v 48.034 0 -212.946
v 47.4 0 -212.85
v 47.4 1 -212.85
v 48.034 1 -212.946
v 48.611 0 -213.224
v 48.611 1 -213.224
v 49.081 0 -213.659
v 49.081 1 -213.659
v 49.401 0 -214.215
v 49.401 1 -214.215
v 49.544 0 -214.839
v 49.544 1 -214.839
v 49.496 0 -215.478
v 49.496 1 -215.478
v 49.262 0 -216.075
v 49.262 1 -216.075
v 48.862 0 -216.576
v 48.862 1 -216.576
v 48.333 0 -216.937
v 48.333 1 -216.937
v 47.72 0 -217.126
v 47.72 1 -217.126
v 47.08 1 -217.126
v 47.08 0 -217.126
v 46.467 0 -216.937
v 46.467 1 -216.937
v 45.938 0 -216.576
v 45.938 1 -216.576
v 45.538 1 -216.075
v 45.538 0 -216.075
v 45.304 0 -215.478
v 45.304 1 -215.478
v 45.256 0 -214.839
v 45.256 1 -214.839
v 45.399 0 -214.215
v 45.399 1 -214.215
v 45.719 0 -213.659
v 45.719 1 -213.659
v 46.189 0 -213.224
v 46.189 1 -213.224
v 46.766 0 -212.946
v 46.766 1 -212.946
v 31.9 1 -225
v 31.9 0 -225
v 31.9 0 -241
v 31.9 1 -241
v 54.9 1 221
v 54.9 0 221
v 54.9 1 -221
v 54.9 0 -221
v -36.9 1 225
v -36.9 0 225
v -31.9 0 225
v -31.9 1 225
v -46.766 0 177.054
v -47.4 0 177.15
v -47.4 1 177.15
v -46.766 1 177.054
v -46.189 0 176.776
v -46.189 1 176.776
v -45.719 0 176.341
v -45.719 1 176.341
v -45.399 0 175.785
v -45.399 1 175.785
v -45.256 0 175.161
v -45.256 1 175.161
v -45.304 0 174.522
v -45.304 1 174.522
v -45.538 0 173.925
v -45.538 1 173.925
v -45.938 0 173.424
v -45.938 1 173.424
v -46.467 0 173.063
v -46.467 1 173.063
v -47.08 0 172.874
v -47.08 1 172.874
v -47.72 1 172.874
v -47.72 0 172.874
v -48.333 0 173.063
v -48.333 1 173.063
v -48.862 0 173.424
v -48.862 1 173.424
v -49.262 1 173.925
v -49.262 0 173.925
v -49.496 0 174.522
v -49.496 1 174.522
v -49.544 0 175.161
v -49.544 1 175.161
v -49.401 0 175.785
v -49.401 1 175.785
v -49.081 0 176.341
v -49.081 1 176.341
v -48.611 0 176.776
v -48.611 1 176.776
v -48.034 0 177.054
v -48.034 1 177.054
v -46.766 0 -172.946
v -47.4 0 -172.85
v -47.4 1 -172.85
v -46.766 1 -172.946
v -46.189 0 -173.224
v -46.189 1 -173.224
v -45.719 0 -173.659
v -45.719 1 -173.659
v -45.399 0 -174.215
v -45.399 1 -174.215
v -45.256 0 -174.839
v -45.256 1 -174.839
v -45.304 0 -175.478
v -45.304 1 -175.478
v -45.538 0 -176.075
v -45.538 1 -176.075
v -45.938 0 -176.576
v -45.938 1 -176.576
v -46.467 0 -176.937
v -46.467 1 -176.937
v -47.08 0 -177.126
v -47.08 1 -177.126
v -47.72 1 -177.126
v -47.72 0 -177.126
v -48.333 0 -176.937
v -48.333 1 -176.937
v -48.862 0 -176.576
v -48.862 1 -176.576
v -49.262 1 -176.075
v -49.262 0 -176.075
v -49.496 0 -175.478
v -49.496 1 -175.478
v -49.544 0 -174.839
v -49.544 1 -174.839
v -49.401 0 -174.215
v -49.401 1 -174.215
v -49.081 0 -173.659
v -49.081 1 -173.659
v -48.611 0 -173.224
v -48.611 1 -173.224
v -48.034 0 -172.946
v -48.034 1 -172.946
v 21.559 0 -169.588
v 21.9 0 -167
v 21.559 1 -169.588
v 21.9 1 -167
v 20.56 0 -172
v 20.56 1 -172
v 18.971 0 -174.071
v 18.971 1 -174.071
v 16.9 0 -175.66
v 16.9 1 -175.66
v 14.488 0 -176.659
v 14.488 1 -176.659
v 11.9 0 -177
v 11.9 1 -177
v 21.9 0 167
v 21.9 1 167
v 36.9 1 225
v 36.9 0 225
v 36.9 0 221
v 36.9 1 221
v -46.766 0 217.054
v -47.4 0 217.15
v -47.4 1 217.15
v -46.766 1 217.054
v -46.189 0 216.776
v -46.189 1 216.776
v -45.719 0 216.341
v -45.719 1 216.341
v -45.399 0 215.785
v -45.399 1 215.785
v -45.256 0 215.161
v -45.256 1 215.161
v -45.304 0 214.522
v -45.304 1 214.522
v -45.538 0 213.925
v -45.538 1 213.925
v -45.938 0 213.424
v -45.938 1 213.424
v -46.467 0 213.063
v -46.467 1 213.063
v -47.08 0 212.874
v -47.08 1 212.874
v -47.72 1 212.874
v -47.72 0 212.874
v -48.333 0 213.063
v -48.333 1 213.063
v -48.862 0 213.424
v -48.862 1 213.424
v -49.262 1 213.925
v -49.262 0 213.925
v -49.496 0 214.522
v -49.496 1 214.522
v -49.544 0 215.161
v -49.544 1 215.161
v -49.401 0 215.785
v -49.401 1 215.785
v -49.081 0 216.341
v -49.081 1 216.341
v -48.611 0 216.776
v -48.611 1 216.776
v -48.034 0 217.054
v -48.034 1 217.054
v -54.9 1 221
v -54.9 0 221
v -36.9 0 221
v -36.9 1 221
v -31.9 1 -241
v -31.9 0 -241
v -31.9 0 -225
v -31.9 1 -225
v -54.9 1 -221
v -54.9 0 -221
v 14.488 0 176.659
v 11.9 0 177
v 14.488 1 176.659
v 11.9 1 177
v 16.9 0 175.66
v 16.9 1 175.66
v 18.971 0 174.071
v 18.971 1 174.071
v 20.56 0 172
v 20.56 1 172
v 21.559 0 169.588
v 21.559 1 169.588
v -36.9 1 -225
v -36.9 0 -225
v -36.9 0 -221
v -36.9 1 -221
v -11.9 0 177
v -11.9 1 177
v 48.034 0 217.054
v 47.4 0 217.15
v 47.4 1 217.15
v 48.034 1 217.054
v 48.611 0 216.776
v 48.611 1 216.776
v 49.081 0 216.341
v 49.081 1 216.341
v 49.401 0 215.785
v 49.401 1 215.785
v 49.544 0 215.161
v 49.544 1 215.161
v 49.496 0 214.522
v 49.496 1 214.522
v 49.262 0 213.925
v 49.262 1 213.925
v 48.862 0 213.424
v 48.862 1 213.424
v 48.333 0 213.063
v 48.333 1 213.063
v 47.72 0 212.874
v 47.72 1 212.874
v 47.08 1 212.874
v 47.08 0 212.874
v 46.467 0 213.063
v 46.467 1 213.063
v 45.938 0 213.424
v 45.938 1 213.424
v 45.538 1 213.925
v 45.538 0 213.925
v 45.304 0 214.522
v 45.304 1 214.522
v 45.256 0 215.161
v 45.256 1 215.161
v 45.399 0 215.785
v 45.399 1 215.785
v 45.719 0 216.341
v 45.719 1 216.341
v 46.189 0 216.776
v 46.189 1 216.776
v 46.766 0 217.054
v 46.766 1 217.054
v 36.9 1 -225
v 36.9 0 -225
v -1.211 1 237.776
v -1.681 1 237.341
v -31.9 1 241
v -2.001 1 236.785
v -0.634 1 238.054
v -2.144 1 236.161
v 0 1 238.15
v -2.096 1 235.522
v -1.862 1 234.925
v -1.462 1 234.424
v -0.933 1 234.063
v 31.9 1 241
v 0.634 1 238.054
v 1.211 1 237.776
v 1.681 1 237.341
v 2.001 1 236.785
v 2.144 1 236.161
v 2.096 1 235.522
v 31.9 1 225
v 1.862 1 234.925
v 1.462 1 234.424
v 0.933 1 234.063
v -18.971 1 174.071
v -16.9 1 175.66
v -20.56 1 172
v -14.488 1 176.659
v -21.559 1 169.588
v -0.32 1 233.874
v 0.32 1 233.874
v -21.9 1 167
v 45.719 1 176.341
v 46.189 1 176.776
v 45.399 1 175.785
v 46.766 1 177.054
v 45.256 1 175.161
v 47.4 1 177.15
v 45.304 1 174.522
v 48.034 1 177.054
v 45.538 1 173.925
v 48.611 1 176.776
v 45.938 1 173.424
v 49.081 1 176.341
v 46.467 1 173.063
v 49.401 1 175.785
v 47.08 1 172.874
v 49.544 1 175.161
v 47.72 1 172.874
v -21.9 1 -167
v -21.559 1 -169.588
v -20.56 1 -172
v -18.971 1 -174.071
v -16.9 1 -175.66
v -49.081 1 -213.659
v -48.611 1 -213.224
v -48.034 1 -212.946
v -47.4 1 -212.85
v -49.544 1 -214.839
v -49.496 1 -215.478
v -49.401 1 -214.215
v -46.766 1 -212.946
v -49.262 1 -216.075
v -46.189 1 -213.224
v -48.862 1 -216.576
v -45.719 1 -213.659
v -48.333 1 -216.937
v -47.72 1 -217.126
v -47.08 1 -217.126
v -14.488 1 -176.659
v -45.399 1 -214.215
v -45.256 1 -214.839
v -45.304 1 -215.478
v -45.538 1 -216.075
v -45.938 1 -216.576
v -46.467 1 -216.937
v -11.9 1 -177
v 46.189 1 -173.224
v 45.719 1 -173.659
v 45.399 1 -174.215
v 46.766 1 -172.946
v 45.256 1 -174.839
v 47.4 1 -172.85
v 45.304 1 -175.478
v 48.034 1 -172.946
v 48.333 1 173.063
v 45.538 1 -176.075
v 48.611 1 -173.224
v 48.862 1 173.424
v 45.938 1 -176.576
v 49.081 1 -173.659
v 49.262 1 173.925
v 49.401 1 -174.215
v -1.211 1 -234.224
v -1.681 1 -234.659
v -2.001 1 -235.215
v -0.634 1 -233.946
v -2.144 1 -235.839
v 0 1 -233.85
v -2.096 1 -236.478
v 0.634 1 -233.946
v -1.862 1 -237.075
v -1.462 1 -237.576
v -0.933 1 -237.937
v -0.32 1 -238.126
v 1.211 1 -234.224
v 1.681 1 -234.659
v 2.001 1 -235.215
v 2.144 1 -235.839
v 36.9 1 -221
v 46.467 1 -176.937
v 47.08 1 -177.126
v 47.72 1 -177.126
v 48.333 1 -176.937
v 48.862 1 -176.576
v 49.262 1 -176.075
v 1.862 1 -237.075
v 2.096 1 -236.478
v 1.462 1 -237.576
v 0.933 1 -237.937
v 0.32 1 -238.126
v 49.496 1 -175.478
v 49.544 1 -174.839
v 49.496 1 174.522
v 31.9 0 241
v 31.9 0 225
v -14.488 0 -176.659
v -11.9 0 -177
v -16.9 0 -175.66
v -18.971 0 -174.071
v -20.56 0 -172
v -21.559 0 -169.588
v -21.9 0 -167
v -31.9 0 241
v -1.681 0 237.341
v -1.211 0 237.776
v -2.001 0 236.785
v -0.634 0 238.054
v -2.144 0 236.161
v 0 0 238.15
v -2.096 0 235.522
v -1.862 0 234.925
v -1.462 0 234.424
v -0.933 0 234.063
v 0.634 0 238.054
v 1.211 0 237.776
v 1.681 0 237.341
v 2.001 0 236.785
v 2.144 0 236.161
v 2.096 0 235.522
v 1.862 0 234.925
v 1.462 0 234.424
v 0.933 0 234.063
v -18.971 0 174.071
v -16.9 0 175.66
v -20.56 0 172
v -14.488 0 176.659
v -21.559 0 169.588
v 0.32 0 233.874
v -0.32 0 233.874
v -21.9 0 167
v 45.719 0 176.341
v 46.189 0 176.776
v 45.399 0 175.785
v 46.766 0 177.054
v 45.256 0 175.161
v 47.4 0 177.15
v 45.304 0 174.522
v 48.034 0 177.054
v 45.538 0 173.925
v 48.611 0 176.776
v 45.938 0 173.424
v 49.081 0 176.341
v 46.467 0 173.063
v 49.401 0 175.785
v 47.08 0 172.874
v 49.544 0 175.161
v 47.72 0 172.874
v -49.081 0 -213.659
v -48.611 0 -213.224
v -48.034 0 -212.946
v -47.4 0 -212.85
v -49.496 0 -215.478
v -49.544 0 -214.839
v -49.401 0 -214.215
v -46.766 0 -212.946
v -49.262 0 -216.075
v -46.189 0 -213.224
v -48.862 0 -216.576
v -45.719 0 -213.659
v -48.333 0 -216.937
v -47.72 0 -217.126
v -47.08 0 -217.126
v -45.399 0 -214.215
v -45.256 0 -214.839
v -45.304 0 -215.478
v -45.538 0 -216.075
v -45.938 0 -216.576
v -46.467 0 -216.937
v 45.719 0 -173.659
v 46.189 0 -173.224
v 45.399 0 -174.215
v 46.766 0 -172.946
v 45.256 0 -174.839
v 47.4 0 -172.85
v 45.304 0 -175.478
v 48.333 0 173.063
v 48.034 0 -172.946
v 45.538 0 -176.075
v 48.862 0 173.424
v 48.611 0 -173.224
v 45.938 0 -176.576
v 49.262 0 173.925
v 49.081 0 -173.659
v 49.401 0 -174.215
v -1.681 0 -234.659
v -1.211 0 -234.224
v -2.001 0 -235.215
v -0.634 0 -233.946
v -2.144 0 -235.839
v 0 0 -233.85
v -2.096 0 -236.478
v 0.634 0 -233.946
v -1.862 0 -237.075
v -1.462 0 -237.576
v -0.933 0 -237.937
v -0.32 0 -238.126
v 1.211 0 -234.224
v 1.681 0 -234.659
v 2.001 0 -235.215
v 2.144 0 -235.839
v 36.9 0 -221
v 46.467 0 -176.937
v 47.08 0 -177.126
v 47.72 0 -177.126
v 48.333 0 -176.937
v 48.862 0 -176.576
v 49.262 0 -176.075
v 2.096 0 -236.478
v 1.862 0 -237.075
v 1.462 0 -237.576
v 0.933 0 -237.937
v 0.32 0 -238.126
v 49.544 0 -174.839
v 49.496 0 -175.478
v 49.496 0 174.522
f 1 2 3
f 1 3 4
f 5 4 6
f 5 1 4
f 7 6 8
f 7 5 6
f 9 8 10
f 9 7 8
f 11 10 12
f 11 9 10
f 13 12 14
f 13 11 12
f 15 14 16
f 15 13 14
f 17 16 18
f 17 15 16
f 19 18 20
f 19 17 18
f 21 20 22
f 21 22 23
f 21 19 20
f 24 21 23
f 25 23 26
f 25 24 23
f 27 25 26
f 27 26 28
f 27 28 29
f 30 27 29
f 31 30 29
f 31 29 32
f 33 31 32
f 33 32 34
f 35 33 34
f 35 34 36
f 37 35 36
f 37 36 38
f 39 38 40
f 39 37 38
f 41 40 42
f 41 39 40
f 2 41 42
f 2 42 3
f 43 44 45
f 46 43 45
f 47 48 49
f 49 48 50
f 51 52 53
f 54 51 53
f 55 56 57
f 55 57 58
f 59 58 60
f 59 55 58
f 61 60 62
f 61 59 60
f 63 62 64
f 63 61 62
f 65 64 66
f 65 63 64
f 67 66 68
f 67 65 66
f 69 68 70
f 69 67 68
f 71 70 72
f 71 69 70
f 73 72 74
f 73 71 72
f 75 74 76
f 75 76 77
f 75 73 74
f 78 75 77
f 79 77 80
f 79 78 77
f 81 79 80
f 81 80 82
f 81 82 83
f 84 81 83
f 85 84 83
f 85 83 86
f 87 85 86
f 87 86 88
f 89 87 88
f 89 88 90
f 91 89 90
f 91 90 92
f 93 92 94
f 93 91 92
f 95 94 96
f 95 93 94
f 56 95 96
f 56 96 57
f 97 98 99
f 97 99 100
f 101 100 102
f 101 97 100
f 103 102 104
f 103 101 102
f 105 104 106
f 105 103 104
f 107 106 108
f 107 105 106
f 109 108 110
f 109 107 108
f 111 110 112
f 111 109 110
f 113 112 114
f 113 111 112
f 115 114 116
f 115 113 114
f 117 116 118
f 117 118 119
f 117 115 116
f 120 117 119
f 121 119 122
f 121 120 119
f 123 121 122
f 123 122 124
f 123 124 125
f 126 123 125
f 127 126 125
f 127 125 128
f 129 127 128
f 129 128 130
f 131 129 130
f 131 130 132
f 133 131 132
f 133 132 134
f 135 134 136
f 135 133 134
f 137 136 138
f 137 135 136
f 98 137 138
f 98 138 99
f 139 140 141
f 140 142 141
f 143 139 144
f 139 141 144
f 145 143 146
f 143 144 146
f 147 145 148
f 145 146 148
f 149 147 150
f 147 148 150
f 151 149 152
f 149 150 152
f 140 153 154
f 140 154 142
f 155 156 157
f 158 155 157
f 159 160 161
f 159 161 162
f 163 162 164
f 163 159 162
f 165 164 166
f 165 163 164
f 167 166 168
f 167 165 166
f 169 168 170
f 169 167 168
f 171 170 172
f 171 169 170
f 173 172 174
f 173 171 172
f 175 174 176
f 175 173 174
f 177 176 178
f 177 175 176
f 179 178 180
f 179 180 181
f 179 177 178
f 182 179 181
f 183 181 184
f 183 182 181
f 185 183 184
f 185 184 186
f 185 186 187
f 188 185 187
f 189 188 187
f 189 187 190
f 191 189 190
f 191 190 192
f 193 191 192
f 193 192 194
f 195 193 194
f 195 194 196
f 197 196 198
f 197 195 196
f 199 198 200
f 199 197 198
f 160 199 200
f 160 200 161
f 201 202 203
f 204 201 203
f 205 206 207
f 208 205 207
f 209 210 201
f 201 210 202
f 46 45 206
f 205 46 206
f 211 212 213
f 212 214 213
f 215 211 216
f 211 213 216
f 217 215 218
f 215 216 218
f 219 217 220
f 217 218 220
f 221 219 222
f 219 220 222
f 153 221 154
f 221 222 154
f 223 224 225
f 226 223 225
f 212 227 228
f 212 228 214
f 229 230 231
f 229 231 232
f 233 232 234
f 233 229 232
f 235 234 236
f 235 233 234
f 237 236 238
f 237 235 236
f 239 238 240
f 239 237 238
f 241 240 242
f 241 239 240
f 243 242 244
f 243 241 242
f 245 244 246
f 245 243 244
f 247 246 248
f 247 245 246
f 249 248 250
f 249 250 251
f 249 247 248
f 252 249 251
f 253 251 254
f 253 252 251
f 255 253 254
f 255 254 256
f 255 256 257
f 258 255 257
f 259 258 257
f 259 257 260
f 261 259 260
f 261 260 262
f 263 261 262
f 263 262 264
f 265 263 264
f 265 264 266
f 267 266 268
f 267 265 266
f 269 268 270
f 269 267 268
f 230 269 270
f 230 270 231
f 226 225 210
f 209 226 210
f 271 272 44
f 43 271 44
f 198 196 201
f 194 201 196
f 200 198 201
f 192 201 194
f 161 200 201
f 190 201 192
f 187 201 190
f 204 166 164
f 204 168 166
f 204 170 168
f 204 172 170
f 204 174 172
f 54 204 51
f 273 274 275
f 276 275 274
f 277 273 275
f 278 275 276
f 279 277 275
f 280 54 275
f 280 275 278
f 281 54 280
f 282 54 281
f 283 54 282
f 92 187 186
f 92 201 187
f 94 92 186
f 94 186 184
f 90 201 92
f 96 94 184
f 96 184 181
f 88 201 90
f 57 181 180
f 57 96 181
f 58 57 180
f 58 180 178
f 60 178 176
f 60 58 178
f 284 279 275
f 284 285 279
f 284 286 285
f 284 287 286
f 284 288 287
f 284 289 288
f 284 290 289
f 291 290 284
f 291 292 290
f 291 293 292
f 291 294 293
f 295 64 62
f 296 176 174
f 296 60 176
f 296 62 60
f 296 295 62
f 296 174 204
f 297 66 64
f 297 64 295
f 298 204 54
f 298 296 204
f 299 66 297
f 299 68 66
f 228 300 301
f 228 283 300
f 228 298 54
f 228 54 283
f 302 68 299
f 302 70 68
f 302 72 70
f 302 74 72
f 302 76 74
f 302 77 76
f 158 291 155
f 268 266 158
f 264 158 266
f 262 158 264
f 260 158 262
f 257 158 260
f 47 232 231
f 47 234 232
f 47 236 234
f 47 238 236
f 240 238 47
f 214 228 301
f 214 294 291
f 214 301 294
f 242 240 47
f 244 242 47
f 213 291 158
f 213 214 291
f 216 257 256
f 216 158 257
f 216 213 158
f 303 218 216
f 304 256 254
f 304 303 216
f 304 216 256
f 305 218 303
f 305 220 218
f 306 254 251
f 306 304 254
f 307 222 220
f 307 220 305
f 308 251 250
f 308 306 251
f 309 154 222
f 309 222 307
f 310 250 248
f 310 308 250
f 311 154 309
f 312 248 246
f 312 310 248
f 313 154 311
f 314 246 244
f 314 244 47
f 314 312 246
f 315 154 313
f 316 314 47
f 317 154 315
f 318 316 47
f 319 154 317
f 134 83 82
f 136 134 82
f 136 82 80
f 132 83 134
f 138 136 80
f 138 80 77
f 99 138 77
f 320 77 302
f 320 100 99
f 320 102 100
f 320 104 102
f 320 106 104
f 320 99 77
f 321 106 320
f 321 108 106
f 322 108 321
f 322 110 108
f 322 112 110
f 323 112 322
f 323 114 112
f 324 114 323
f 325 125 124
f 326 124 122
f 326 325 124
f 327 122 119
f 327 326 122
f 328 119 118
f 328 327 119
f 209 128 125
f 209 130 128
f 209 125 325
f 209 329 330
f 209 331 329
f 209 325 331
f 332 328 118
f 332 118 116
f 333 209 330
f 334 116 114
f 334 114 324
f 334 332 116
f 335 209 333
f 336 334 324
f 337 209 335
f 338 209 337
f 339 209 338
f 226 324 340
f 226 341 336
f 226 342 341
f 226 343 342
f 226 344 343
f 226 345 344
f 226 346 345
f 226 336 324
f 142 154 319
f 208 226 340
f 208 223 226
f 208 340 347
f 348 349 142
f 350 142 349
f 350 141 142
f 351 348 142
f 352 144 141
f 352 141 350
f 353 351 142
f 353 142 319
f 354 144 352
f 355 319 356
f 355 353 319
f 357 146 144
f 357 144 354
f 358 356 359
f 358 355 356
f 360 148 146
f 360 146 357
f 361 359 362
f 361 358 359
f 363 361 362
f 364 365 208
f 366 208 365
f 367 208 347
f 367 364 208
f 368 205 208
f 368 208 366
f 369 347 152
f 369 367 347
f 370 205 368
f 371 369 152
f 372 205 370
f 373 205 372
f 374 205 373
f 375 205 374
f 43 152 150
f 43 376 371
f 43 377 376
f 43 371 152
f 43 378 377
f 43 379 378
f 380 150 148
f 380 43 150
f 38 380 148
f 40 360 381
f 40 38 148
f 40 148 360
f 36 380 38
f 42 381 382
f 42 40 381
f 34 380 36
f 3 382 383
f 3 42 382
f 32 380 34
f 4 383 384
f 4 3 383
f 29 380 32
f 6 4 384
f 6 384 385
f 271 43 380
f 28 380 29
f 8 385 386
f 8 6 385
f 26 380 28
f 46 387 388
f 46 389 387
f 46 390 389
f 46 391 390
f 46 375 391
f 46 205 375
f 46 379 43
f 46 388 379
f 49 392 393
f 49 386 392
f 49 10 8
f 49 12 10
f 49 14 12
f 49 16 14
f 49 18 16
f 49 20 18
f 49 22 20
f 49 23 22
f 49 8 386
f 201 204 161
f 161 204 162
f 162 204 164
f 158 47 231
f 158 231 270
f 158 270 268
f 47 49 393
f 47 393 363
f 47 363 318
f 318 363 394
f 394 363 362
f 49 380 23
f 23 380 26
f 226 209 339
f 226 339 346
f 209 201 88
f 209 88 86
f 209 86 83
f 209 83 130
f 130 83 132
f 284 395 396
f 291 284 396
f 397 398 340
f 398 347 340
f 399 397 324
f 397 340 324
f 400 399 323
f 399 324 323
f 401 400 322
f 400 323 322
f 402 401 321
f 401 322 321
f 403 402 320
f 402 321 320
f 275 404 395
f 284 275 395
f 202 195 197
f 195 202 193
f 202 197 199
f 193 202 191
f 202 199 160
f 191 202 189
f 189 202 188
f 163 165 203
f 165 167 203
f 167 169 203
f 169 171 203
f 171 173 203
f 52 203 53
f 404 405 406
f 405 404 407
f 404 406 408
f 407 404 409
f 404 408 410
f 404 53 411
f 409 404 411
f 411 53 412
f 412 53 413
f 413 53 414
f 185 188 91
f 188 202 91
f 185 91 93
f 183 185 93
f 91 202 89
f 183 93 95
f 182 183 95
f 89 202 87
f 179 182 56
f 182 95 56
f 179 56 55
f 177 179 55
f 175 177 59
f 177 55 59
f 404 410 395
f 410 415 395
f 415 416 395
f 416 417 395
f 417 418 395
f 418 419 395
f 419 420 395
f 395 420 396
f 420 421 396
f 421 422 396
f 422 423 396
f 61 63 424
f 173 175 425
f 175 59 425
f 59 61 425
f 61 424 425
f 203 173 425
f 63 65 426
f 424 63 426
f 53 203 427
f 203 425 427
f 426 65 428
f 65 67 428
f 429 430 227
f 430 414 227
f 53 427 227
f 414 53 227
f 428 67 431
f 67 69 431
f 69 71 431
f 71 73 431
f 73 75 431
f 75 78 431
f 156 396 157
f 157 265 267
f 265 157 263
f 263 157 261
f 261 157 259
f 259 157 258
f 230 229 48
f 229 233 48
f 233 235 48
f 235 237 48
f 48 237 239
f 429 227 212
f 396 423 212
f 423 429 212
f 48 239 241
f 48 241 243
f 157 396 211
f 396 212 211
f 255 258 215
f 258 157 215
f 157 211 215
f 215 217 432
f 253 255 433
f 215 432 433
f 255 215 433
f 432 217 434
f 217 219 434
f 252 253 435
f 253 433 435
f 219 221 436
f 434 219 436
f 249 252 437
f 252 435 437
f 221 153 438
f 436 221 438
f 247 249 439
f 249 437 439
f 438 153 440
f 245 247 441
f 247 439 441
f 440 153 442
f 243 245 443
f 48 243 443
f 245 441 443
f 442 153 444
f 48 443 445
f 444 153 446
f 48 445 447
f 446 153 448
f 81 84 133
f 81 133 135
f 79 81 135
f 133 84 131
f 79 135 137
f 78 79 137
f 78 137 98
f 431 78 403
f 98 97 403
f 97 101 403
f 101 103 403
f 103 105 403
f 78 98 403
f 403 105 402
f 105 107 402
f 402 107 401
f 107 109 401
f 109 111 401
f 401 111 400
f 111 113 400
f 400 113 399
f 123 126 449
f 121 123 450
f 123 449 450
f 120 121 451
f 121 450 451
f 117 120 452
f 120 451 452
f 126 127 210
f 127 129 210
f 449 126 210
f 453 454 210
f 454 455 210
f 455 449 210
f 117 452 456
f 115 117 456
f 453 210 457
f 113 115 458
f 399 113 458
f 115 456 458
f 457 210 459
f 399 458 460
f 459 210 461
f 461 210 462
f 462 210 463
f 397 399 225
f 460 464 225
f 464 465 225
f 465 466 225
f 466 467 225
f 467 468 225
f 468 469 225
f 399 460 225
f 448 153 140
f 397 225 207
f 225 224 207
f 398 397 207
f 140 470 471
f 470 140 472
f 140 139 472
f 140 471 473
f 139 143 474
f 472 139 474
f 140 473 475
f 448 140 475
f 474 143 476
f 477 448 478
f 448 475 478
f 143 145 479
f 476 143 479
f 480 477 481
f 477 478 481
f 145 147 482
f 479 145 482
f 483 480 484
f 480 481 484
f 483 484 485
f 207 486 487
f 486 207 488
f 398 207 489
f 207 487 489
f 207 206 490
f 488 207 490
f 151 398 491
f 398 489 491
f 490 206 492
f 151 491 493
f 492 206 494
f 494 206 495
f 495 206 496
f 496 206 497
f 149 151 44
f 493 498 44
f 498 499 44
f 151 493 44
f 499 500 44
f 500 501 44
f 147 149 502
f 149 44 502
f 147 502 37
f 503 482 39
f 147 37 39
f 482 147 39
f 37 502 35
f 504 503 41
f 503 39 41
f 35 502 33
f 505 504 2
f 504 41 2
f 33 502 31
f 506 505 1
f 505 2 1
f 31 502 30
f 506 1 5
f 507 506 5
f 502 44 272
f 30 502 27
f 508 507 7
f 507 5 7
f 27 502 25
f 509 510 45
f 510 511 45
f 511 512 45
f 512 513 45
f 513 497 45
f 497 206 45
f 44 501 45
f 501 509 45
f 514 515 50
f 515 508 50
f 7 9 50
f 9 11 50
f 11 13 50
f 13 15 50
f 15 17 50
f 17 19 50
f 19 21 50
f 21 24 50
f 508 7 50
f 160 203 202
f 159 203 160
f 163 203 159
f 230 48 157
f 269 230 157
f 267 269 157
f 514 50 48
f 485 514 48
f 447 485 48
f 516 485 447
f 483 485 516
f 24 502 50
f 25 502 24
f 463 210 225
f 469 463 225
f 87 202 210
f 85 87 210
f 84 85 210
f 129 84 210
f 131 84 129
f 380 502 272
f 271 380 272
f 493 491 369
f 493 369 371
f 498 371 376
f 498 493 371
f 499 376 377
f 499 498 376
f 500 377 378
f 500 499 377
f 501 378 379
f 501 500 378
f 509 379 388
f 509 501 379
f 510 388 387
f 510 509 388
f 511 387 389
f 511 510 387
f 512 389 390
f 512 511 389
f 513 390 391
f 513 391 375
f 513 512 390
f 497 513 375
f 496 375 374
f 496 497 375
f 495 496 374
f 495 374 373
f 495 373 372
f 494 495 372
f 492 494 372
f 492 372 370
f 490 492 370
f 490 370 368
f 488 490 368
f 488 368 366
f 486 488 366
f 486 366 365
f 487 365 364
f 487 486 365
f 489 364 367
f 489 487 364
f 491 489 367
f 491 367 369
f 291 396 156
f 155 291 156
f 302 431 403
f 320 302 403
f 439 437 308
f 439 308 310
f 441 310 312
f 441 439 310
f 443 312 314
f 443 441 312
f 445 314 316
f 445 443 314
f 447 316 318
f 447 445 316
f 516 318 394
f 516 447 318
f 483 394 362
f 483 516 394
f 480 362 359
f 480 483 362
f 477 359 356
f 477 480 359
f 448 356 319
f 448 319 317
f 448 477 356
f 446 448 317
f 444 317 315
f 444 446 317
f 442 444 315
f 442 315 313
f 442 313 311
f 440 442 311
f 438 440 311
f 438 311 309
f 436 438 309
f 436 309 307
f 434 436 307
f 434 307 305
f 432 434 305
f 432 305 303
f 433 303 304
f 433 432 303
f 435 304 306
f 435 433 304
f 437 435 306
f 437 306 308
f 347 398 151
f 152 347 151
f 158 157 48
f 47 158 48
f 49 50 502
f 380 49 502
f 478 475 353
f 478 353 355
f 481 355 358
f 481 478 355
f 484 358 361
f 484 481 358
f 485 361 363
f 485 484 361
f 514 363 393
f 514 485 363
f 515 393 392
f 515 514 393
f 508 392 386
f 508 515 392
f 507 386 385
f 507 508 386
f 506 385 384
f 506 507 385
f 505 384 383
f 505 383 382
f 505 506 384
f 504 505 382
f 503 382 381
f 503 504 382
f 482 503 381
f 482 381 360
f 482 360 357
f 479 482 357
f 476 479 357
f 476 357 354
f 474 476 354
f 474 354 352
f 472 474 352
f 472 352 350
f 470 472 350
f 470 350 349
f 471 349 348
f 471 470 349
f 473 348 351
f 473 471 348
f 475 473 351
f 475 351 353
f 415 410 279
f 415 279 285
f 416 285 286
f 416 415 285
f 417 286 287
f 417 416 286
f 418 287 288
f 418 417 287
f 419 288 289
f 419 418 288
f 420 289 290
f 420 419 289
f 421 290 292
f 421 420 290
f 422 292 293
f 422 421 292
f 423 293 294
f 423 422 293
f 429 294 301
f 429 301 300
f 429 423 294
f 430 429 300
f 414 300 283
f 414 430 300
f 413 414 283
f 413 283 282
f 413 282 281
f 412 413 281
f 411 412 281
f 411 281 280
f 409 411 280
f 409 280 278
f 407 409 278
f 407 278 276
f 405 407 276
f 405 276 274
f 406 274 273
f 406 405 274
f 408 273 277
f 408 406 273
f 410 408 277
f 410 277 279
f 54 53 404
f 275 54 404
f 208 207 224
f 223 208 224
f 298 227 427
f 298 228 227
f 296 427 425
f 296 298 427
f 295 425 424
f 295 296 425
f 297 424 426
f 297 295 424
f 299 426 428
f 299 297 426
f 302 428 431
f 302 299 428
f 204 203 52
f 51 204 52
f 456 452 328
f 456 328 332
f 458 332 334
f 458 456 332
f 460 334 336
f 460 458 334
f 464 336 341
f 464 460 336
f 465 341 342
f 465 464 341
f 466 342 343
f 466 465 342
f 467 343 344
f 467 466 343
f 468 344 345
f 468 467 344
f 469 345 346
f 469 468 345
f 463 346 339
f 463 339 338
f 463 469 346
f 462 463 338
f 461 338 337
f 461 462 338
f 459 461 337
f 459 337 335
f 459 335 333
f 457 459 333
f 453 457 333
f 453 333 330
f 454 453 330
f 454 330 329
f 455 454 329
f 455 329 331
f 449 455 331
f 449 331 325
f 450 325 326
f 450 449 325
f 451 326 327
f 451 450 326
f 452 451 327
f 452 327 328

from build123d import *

# Parameters (mm, degrees)
SKETCH1_R           = 2.15
SKETCH1_W           = 43.8
SKETCH1_H           = 354
BOSS_EXTRUDE1_DEPTH = 1
FILLET2_R           = 10


with BuildPart() as part:
    # Sketch1 → Boss-Extrude1 (new body)
    with BuildSketch(Plane(origin=(0, 0, 0), x_dir=(1, 0, 0), z_dir=(0, 1, 0))):
        Polygon((-54.9, -221), (-36.9, -221), (-36.9, -225), (-31.9, -225), (-31.9, -241), (31.9, -241), (31.9, -225), (36.9, -225), (36.9, -221), (54.9, -221), (54.9, 221), (36.9, 221), (36.9, 225), (31.9, 225), (31.9, 241), (-31.9, 241), (-31.9, 225), (-36.9, 225), (-36.9, 221), (-54.9, 221), align=None)
        with Locations(Location((-47.4, 175, 0), (0, 0, 270))):
            Circle(SKETCH1_R, mode=Mode.SUBTRACT)
        with Locations(Location((47.4, 175, 0), (0, 0, 270))):
            Circle(SKETCH1_R, mode=Mode.SUBTRACT)
        with Locations(Location((-47.4, -175, 0), (0, 0, 270))):
            Circle(SKETCH1_R, mode=Mode.SUBTRACT)
        with Locations(Location((47.4, -175, 0), (0, 0, 270))):
            Circle(SKETCH1_R, mode=Mode.SUBTRACT)
        with Locations(Location((-47.4, -215, 0), (0, 0, 270))):
            Circle(SKETCH1_R, mode=Mode.SUBTRACT)
        with Locations(Location((47.4, -215, 0), (0, 0, 270))):
            Circle(SKETCH1_R, mode=Mode.SUBTRACT)
        with Locations(Location((47.4, 215, 0), (0, 0, 270))):
            Circle(SKETCH1_R, mode=Mode.SUBTRACT)
        with Locations(Location((-47.4, 215, 0), (0, 0, 270))):
            Circle(SKETCH1_R, mode=Mode.SUBTRACT)
        with Locations(Location((0, 236, 0), (0, 0, 270))):
            Circle(SKETCH1_R, mode=Mode.SUBTRACT)
        with Locations(Location((0, -236, 0), (0, 0, 270))):
            Circle(SKETCH1_R, mode=Mode.SUBTRACT)
        Rectangle(SKETCH1_W, SKETCH1_H, mode=Mode.SUBTRACT)
    extrude(amount=BOSS_EXTRUDE1_DEPTH)

    # Fillet2
    fillet2_edges = [part.edges().sort_by_distance(p)[0] for p in [
        (21.9, 0.5, 177),
        (21.9, 0.5, -177),
        (-21.9, 0.5, -177),
        (-21.9, 0.5, 177),
    ]]
    fillet(fillet2_edges, radius=FILLET2_R)


solid = part.part
